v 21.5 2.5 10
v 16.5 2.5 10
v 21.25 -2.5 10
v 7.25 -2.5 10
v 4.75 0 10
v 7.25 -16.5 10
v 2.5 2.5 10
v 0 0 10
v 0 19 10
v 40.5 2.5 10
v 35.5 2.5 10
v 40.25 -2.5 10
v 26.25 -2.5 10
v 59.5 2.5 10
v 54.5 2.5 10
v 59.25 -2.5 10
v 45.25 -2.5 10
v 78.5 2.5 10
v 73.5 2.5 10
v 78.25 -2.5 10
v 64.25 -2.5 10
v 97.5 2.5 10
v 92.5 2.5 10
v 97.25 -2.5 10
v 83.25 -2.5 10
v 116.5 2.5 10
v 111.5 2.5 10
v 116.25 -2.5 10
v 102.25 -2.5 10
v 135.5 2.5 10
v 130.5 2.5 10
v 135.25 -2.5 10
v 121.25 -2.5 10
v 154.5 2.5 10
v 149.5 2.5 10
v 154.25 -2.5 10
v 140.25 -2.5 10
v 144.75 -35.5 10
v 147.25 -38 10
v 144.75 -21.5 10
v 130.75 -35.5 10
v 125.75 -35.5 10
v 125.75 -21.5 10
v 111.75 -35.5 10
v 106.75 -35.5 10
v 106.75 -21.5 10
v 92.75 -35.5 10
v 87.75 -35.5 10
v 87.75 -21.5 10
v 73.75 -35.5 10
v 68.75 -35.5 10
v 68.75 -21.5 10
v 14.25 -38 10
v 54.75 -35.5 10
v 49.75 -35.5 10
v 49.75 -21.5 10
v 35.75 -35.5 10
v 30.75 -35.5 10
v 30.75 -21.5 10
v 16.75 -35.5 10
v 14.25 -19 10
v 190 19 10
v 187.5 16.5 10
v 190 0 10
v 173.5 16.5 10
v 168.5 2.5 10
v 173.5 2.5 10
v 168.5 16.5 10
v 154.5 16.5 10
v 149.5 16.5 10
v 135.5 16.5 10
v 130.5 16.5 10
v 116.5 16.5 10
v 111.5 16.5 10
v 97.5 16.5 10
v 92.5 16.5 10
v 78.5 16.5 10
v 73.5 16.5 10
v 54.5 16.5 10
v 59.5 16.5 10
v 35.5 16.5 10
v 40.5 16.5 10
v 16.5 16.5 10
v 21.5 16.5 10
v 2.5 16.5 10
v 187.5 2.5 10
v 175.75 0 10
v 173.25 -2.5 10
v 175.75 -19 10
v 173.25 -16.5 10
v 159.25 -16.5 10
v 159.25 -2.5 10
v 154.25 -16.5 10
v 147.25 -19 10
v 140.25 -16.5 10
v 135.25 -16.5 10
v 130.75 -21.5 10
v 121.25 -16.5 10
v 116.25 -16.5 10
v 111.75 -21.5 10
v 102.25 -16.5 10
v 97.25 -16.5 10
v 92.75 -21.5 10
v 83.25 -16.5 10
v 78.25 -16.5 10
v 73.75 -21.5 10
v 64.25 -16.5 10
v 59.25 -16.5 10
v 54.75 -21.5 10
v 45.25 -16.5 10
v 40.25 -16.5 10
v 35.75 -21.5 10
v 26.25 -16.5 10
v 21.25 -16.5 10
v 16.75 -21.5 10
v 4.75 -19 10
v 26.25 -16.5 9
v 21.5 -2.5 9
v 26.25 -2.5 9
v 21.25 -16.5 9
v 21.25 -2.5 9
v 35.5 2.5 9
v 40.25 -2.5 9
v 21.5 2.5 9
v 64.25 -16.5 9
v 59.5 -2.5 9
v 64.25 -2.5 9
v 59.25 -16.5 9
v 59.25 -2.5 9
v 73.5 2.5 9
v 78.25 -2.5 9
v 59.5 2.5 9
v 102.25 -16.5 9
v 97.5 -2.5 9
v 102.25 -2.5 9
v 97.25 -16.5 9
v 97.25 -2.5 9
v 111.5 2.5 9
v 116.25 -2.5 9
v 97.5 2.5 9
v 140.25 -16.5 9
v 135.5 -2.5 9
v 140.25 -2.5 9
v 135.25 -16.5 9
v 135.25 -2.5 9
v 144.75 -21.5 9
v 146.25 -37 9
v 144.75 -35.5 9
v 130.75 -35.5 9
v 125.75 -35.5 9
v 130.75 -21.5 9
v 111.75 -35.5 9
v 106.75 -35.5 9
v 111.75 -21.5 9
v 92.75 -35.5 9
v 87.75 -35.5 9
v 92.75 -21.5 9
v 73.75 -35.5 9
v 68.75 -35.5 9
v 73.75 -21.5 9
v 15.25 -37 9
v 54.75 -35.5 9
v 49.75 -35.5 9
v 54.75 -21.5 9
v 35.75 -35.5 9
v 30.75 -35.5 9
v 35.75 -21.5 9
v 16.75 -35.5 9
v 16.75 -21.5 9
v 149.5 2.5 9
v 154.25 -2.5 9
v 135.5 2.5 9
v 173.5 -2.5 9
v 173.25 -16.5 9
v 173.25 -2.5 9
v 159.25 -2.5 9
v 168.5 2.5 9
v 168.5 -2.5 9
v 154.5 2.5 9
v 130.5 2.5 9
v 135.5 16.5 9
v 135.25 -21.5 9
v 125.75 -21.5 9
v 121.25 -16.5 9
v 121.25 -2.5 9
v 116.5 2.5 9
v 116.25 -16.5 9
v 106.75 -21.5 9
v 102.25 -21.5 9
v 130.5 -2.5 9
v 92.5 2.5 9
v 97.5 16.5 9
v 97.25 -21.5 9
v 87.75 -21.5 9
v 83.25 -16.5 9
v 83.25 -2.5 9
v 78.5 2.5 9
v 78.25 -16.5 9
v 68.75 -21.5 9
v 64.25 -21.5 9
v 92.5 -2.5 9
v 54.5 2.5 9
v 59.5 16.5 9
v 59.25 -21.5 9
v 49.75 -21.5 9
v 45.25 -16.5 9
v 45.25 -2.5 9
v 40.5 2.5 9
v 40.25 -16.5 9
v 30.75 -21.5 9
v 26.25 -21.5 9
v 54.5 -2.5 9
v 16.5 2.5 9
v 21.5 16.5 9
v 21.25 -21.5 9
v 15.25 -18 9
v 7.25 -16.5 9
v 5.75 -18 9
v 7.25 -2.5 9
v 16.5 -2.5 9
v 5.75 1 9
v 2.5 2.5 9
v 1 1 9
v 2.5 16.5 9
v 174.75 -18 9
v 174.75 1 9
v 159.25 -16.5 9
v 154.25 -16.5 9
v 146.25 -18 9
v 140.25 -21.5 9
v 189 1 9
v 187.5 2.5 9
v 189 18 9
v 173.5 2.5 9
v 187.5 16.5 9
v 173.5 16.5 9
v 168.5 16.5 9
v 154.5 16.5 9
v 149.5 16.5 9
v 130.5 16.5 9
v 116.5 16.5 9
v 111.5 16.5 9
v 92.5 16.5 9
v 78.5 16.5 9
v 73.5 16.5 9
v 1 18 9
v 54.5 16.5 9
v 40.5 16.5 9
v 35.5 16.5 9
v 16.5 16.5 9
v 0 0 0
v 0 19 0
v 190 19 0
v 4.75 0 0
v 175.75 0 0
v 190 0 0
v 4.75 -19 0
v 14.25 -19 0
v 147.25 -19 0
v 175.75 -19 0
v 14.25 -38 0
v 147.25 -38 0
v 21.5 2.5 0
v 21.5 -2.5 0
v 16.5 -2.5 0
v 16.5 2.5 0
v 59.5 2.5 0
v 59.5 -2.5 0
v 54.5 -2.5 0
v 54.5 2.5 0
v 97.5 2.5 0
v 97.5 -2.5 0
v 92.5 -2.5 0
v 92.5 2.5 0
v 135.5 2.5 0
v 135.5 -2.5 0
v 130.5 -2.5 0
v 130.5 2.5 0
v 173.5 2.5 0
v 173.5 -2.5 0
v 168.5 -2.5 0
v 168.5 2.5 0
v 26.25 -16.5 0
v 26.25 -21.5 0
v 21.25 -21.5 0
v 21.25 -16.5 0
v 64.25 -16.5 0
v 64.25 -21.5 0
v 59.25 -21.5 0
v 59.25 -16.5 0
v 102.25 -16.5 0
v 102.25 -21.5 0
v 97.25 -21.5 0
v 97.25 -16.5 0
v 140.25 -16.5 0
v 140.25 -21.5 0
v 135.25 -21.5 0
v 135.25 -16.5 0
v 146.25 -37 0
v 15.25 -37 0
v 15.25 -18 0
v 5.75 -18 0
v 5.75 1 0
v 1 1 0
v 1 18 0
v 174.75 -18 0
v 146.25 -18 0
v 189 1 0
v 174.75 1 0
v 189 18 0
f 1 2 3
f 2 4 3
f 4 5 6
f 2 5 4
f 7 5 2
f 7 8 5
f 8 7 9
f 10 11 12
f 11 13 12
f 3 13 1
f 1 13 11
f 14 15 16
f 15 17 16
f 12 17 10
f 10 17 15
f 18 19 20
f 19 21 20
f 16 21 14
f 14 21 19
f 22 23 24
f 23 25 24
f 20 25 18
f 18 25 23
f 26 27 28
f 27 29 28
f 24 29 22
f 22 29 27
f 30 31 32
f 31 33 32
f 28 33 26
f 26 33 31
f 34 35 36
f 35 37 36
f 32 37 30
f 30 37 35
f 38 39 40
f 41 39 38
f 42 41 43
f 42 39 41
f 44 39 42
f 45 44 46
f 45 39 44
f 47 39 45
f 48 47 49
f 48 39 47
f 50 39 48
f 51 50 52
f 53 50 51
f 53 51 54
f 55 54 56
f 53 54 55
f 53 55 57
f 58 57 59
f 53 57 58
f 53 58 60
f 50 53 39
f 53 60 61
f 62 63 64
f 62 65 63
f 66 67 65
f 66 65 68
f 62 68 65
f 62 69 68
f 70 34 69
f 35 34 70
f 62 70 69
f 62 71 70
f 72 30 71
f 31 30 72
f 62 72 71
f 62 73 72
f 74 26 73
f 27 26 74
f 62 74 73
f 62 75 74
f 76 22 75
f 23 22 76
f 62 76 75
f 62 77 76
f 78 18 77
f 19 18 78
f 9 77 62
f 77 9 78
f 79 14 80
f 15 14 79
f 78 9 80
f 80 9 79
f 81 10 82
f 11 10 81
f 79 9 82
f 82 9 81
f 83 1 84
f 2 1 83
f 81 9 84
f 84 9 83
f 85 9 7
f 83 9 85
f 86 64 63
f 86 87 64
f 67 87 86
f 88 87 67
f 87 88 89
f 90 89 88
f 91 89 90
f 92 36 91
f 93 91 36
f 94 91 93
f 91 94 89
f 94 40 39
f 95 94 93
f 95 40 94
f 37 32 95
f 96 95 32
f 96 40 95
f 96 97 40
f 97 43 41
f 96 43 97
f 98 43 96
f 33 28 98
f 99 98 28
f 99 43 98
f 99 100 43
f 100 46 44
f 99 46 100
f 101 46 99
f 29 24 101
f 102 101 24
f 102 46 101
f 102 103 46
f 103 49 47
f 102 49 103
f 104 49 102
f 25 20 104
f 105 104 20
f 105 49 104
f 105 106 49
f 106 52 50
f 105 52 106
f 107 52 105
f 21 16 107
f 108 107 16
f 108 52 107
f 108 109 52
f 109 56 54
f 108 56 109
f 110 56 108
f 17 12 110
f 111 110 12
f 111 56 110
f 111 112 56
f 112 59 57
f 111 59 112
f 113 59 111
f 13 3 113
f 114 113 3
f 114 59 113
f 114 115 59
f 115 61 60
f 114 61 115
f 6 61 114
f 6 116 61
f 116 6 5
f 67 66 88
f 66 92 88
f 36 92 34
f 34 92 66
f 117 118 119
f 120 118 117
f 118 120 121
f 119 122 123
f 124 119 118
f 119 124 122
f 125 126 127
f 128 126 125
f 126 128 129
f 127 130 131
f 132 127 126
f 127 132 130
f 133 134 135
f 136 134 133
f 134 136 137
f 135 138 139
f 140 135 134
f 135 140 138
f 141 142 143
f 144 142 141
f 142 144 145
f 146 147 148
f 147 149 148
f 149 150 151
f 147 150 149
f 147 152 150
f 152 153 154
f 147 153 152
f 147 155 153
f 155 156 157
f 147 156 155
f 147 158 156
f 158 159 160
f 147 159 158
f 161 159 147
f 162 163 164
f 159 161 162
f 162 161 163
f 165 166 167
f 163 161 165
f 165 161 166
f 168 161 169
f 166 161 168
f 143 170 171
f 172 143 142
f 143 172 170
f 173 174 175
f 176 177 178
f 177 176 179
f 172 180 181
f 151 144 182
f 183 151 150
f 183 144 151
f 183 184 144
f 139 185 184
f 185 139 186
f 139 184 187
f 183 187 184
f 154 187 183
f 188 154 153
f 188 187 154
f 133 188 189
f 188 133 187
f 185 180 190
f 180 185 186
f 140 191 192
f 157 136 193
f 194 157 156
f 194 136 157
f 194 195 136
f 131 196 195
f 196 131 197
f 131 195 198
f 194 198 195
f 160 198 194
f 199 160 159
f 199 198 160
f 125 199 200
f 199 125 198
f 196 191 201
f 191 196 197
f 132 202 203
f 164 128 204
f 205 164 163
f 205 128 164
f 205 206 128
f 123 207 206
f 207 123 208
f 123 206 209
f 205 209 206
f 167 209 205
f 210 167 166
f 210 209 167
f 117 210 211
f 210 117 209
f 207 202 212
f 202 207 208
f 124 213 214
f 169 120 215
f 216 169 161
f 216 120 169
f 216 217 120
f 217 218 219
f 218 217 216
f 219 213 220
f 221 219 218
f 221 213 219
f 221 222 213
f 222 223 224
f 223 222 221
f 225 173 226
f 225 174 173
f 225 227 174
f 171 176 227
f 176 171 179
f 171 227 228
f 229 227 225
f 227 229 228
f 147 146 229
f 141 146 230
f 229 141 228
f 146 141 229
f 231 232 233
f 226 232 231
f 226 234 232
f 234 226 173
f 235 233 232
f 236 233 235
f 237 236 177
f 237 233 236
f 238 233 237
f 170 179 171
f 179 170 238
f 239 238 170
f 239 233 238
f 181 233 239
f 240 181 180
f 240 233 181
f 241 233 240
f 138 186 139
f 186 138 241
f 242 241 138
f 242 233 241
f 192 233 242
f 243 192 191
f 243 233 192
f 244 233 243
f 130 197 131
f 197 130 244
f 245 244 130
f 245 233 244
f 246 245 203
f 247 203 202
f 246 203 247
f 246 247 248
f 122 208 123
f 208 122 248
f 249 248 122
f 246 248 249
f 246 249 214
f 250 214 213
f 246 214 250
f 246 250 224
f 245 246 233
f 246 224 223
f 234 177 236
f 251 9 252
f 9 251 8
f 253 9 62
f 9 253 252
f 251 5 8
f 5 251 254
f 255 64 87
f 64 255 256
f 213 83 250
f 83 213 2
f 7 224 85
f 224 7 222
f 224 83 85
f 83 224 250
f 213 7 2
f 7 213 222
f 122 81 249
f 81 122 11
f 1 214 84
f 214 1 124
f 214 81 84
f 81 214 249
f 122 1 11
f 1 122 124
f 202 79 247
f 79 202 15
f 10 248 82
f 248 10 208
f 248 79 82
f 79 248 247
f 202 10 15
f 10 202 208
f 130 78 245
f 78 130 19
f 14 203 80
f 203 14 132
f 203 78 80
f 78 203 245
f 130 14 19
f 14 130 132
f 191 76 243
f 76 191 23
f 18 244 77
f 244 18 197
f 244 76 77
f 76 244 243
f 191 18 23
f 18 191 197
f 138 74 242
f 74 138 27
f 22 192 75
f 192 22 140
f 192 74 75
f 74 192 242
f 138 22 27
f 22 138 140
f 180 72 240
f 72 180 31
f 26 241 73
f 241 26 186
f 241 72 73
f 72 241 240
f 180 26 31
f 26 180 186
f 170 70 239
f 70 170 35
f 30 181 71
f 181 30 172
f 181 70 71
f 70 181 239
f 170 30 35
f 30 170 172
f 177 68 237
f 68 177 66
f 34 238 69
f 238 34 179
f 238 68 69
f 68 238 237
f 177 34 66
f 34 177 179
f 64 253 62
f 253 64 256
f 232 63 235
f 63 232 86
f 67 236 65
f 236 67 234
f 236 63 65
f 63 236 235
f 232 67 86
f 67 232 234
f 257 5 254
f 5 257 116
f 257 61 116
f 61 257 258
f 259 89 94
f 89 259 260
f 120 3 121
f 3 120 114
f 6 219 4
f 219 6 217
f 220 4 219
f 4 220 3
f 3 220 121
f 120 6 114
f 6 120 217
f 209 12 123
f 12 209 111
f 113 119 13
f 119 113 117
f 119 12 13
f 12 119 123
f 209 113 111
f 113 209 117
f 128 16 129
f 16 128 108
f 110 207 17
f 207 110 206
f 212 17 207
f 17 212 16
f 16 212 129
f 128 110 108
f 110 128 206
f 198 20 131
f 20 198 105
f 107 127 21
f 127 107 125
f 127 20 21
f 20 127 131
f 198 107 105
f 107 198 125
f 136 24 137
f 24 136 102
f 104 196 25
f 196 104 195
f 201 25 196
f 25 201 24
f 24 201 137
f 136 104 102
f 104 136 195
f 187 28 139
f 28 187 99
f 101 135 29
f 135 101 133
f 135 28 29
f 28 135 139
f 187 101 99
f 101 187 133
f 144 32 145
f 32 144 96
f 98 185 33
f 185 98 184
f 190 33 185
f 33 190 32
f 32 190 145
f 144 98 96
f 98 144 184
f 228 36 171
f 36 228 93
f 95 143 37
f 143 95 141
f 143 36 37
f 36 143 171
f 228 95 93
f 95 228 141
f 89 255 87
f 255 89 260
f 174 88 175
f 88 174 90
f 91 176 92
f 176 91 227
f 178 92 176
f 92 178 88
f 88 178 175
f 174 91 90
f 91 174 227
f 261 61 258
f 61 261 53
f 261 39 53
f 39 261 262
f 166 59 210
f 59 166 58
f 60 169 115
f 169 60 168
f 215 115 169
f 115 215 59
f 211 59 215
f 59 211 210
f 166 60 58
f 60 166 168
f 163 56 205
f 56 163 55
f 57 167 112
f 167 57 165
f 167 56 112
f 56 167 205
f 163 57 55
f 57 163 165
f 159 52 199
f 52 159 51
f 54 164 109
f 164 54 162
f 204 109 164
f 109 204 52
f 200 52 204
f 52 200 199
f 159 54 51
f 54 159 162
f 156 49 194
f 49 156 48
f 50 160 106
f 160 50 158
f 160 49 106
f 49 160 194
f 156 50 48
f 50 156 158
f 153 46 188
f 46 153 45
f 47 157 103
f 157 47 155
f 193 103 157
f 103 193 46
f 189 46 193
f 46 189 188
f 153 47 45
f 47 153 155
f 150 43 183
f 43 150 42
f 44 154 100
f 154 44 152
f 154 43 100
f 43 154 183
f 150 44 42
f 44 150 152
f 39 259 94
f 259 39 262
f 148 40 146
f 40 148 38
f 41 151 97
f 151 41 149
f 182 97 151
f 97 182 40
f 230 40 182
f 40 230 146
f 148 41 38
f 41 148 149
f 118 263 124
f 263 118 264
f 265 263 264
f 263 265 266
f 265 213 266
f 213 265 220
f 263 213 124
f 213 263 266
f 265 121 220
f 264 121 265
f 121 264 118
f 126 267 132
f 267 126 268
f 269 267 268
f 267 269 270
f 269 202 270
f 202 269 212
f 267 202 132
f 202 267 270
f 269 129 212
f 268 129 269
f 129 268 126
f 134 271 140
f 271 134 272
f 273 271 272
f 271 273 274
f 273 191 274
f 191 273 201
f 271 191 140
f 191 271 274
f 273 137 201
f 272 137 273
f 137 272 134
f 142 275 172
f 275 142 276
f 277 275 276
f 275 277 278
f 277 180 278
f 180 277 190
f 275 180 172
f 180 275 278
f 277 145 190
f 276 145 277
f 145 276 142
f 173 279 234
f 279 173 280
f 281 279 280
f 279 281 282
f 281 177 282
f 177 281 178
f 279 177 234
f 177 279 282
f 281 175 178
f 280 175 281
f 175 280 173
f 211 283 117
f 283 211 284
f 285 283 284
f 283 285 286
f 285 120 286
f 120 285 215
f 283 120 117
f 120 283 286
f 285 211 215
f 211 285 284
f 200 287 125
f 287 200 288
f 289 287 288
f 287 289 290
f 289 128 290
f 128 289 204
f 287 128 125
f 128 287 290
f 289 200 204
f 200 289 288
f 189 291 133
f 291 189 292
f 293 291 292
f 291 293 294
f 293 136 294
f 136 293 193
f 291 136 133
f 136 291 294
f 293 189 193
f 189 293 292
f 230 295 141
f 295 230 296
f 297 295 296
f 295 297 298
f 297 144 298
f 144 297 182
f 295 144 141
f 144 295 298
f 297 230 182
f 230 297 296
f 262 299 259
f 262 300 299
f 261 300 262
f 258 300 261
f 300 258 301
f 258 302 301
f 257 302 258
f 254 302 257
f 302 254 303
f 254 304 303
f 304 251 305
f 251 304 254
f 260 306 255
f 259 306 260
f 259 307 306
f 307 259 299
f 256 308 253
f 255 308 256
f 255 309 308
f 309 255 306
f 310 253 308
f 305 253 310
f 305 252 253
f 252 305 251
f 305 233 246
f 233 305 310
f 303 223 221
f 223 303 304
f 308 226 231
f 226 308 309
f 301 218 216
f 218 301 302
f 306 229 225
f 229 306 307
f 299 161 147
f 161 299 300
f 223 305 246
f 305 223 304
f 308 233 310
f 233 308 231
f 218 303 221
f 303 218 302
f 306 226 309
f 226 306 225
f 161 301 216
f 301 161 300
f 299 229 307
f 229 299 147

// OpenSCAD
hole=14;
socket=19;
rim=(socket - hole) / 2;
holeHeight=1;
socketHeight=10;

row2x = socket * 0.25;
row3x = socket * 0.75;
    

module key(x, y) {
    translate([x, y, 0]) {
        translate ([0, 0, socketHeight - holeHeight]) {
            difference() {
                cube ([socket, socket, holeHeight]);
                translate ([rim, rim, 0]) {
                    cube ([hole, hole, holeHeight]);
                }
            }
        }
    }
}

module legs(startx, y, endx, width, length) {
    for (x = [startx : 2*(hole + rim*width) : endx] ) {
        translate ([x, y, 0]) {
            cube ([rim * width, rim * length, socketHeight - holeHeight]);
        }
    }
}

union() {
    for (i = [0 : 9]) {
        key(i * socket, 0);
    }
    for (i = [0 : 8]) {
        key(row2x + i * socket, -socket);
    }
    for (i = [0 : 6]) {
        key(row3x + i * socket, -socket*2);
    }
}

union() {
    legs(hole+rim, -rim, 9*socket, 2, 2);
    legs(hole+rim + row2x, -rim - socket, 8*socket, 2, 2);
}

edge=1;
union() {
    translate ([0, socket - edge, 0]) {
        cube ([10*socket, edge, socketHeight - holeHeight]);
    }
    translate ([0, 0, 0]) {
        cube ([row2x, edge, socketHeight - holeHeight]);
    }
    translate ([row2x + (9 * socket), 0, 0]) {
        cube ([socket - row2x, edge, socketHeight - holeHeight]);
    }
    translate ([row2x, -socket, 0]) {
        cube ([row3x - row2x, edge, socketHeight - holeHeight]);
    }
    translate ([row3x + 7*socket, -socket, 0]) {
        cube ([row3x - row2x + socket, edge, socketHeight - holeHeight]);
    }
    translate ([row3x, -2*socket, 0]) {
        cube ([7*socket, edge, socketHeight - holeHeight]);
    }

    translate ([0, edge, 0]) {
        cube ([edge, socket - 2 * edge, socketHeight - holeHeight]);
    }
    translate ([socket*10 - edge, edge, 0]) {
        cube ([edge, socket - 2 * edge, socketHeight - holeHeight]);
    }

    translate ([row2x, - socket + edge, 0]) {
        cube ([edge, socket, socketHeight - holeHeight]);
    }
    translate ([row2x + 9*socket - edge, - socket, 0]) {
        cube ([edge, socket + edge, socketHeight - holeHeight]);
    }

    translate ([row3x, - 2*socket + edge, 0]) {
        cube ([edge, socket, socketHeight - holeHeight]);
    }
    translate ([row3x + 7*socket - edge, - 2*socket + edge, 0]) {
        cube ([edge, socket, socketHeight - holeHeight]);
    }
}
